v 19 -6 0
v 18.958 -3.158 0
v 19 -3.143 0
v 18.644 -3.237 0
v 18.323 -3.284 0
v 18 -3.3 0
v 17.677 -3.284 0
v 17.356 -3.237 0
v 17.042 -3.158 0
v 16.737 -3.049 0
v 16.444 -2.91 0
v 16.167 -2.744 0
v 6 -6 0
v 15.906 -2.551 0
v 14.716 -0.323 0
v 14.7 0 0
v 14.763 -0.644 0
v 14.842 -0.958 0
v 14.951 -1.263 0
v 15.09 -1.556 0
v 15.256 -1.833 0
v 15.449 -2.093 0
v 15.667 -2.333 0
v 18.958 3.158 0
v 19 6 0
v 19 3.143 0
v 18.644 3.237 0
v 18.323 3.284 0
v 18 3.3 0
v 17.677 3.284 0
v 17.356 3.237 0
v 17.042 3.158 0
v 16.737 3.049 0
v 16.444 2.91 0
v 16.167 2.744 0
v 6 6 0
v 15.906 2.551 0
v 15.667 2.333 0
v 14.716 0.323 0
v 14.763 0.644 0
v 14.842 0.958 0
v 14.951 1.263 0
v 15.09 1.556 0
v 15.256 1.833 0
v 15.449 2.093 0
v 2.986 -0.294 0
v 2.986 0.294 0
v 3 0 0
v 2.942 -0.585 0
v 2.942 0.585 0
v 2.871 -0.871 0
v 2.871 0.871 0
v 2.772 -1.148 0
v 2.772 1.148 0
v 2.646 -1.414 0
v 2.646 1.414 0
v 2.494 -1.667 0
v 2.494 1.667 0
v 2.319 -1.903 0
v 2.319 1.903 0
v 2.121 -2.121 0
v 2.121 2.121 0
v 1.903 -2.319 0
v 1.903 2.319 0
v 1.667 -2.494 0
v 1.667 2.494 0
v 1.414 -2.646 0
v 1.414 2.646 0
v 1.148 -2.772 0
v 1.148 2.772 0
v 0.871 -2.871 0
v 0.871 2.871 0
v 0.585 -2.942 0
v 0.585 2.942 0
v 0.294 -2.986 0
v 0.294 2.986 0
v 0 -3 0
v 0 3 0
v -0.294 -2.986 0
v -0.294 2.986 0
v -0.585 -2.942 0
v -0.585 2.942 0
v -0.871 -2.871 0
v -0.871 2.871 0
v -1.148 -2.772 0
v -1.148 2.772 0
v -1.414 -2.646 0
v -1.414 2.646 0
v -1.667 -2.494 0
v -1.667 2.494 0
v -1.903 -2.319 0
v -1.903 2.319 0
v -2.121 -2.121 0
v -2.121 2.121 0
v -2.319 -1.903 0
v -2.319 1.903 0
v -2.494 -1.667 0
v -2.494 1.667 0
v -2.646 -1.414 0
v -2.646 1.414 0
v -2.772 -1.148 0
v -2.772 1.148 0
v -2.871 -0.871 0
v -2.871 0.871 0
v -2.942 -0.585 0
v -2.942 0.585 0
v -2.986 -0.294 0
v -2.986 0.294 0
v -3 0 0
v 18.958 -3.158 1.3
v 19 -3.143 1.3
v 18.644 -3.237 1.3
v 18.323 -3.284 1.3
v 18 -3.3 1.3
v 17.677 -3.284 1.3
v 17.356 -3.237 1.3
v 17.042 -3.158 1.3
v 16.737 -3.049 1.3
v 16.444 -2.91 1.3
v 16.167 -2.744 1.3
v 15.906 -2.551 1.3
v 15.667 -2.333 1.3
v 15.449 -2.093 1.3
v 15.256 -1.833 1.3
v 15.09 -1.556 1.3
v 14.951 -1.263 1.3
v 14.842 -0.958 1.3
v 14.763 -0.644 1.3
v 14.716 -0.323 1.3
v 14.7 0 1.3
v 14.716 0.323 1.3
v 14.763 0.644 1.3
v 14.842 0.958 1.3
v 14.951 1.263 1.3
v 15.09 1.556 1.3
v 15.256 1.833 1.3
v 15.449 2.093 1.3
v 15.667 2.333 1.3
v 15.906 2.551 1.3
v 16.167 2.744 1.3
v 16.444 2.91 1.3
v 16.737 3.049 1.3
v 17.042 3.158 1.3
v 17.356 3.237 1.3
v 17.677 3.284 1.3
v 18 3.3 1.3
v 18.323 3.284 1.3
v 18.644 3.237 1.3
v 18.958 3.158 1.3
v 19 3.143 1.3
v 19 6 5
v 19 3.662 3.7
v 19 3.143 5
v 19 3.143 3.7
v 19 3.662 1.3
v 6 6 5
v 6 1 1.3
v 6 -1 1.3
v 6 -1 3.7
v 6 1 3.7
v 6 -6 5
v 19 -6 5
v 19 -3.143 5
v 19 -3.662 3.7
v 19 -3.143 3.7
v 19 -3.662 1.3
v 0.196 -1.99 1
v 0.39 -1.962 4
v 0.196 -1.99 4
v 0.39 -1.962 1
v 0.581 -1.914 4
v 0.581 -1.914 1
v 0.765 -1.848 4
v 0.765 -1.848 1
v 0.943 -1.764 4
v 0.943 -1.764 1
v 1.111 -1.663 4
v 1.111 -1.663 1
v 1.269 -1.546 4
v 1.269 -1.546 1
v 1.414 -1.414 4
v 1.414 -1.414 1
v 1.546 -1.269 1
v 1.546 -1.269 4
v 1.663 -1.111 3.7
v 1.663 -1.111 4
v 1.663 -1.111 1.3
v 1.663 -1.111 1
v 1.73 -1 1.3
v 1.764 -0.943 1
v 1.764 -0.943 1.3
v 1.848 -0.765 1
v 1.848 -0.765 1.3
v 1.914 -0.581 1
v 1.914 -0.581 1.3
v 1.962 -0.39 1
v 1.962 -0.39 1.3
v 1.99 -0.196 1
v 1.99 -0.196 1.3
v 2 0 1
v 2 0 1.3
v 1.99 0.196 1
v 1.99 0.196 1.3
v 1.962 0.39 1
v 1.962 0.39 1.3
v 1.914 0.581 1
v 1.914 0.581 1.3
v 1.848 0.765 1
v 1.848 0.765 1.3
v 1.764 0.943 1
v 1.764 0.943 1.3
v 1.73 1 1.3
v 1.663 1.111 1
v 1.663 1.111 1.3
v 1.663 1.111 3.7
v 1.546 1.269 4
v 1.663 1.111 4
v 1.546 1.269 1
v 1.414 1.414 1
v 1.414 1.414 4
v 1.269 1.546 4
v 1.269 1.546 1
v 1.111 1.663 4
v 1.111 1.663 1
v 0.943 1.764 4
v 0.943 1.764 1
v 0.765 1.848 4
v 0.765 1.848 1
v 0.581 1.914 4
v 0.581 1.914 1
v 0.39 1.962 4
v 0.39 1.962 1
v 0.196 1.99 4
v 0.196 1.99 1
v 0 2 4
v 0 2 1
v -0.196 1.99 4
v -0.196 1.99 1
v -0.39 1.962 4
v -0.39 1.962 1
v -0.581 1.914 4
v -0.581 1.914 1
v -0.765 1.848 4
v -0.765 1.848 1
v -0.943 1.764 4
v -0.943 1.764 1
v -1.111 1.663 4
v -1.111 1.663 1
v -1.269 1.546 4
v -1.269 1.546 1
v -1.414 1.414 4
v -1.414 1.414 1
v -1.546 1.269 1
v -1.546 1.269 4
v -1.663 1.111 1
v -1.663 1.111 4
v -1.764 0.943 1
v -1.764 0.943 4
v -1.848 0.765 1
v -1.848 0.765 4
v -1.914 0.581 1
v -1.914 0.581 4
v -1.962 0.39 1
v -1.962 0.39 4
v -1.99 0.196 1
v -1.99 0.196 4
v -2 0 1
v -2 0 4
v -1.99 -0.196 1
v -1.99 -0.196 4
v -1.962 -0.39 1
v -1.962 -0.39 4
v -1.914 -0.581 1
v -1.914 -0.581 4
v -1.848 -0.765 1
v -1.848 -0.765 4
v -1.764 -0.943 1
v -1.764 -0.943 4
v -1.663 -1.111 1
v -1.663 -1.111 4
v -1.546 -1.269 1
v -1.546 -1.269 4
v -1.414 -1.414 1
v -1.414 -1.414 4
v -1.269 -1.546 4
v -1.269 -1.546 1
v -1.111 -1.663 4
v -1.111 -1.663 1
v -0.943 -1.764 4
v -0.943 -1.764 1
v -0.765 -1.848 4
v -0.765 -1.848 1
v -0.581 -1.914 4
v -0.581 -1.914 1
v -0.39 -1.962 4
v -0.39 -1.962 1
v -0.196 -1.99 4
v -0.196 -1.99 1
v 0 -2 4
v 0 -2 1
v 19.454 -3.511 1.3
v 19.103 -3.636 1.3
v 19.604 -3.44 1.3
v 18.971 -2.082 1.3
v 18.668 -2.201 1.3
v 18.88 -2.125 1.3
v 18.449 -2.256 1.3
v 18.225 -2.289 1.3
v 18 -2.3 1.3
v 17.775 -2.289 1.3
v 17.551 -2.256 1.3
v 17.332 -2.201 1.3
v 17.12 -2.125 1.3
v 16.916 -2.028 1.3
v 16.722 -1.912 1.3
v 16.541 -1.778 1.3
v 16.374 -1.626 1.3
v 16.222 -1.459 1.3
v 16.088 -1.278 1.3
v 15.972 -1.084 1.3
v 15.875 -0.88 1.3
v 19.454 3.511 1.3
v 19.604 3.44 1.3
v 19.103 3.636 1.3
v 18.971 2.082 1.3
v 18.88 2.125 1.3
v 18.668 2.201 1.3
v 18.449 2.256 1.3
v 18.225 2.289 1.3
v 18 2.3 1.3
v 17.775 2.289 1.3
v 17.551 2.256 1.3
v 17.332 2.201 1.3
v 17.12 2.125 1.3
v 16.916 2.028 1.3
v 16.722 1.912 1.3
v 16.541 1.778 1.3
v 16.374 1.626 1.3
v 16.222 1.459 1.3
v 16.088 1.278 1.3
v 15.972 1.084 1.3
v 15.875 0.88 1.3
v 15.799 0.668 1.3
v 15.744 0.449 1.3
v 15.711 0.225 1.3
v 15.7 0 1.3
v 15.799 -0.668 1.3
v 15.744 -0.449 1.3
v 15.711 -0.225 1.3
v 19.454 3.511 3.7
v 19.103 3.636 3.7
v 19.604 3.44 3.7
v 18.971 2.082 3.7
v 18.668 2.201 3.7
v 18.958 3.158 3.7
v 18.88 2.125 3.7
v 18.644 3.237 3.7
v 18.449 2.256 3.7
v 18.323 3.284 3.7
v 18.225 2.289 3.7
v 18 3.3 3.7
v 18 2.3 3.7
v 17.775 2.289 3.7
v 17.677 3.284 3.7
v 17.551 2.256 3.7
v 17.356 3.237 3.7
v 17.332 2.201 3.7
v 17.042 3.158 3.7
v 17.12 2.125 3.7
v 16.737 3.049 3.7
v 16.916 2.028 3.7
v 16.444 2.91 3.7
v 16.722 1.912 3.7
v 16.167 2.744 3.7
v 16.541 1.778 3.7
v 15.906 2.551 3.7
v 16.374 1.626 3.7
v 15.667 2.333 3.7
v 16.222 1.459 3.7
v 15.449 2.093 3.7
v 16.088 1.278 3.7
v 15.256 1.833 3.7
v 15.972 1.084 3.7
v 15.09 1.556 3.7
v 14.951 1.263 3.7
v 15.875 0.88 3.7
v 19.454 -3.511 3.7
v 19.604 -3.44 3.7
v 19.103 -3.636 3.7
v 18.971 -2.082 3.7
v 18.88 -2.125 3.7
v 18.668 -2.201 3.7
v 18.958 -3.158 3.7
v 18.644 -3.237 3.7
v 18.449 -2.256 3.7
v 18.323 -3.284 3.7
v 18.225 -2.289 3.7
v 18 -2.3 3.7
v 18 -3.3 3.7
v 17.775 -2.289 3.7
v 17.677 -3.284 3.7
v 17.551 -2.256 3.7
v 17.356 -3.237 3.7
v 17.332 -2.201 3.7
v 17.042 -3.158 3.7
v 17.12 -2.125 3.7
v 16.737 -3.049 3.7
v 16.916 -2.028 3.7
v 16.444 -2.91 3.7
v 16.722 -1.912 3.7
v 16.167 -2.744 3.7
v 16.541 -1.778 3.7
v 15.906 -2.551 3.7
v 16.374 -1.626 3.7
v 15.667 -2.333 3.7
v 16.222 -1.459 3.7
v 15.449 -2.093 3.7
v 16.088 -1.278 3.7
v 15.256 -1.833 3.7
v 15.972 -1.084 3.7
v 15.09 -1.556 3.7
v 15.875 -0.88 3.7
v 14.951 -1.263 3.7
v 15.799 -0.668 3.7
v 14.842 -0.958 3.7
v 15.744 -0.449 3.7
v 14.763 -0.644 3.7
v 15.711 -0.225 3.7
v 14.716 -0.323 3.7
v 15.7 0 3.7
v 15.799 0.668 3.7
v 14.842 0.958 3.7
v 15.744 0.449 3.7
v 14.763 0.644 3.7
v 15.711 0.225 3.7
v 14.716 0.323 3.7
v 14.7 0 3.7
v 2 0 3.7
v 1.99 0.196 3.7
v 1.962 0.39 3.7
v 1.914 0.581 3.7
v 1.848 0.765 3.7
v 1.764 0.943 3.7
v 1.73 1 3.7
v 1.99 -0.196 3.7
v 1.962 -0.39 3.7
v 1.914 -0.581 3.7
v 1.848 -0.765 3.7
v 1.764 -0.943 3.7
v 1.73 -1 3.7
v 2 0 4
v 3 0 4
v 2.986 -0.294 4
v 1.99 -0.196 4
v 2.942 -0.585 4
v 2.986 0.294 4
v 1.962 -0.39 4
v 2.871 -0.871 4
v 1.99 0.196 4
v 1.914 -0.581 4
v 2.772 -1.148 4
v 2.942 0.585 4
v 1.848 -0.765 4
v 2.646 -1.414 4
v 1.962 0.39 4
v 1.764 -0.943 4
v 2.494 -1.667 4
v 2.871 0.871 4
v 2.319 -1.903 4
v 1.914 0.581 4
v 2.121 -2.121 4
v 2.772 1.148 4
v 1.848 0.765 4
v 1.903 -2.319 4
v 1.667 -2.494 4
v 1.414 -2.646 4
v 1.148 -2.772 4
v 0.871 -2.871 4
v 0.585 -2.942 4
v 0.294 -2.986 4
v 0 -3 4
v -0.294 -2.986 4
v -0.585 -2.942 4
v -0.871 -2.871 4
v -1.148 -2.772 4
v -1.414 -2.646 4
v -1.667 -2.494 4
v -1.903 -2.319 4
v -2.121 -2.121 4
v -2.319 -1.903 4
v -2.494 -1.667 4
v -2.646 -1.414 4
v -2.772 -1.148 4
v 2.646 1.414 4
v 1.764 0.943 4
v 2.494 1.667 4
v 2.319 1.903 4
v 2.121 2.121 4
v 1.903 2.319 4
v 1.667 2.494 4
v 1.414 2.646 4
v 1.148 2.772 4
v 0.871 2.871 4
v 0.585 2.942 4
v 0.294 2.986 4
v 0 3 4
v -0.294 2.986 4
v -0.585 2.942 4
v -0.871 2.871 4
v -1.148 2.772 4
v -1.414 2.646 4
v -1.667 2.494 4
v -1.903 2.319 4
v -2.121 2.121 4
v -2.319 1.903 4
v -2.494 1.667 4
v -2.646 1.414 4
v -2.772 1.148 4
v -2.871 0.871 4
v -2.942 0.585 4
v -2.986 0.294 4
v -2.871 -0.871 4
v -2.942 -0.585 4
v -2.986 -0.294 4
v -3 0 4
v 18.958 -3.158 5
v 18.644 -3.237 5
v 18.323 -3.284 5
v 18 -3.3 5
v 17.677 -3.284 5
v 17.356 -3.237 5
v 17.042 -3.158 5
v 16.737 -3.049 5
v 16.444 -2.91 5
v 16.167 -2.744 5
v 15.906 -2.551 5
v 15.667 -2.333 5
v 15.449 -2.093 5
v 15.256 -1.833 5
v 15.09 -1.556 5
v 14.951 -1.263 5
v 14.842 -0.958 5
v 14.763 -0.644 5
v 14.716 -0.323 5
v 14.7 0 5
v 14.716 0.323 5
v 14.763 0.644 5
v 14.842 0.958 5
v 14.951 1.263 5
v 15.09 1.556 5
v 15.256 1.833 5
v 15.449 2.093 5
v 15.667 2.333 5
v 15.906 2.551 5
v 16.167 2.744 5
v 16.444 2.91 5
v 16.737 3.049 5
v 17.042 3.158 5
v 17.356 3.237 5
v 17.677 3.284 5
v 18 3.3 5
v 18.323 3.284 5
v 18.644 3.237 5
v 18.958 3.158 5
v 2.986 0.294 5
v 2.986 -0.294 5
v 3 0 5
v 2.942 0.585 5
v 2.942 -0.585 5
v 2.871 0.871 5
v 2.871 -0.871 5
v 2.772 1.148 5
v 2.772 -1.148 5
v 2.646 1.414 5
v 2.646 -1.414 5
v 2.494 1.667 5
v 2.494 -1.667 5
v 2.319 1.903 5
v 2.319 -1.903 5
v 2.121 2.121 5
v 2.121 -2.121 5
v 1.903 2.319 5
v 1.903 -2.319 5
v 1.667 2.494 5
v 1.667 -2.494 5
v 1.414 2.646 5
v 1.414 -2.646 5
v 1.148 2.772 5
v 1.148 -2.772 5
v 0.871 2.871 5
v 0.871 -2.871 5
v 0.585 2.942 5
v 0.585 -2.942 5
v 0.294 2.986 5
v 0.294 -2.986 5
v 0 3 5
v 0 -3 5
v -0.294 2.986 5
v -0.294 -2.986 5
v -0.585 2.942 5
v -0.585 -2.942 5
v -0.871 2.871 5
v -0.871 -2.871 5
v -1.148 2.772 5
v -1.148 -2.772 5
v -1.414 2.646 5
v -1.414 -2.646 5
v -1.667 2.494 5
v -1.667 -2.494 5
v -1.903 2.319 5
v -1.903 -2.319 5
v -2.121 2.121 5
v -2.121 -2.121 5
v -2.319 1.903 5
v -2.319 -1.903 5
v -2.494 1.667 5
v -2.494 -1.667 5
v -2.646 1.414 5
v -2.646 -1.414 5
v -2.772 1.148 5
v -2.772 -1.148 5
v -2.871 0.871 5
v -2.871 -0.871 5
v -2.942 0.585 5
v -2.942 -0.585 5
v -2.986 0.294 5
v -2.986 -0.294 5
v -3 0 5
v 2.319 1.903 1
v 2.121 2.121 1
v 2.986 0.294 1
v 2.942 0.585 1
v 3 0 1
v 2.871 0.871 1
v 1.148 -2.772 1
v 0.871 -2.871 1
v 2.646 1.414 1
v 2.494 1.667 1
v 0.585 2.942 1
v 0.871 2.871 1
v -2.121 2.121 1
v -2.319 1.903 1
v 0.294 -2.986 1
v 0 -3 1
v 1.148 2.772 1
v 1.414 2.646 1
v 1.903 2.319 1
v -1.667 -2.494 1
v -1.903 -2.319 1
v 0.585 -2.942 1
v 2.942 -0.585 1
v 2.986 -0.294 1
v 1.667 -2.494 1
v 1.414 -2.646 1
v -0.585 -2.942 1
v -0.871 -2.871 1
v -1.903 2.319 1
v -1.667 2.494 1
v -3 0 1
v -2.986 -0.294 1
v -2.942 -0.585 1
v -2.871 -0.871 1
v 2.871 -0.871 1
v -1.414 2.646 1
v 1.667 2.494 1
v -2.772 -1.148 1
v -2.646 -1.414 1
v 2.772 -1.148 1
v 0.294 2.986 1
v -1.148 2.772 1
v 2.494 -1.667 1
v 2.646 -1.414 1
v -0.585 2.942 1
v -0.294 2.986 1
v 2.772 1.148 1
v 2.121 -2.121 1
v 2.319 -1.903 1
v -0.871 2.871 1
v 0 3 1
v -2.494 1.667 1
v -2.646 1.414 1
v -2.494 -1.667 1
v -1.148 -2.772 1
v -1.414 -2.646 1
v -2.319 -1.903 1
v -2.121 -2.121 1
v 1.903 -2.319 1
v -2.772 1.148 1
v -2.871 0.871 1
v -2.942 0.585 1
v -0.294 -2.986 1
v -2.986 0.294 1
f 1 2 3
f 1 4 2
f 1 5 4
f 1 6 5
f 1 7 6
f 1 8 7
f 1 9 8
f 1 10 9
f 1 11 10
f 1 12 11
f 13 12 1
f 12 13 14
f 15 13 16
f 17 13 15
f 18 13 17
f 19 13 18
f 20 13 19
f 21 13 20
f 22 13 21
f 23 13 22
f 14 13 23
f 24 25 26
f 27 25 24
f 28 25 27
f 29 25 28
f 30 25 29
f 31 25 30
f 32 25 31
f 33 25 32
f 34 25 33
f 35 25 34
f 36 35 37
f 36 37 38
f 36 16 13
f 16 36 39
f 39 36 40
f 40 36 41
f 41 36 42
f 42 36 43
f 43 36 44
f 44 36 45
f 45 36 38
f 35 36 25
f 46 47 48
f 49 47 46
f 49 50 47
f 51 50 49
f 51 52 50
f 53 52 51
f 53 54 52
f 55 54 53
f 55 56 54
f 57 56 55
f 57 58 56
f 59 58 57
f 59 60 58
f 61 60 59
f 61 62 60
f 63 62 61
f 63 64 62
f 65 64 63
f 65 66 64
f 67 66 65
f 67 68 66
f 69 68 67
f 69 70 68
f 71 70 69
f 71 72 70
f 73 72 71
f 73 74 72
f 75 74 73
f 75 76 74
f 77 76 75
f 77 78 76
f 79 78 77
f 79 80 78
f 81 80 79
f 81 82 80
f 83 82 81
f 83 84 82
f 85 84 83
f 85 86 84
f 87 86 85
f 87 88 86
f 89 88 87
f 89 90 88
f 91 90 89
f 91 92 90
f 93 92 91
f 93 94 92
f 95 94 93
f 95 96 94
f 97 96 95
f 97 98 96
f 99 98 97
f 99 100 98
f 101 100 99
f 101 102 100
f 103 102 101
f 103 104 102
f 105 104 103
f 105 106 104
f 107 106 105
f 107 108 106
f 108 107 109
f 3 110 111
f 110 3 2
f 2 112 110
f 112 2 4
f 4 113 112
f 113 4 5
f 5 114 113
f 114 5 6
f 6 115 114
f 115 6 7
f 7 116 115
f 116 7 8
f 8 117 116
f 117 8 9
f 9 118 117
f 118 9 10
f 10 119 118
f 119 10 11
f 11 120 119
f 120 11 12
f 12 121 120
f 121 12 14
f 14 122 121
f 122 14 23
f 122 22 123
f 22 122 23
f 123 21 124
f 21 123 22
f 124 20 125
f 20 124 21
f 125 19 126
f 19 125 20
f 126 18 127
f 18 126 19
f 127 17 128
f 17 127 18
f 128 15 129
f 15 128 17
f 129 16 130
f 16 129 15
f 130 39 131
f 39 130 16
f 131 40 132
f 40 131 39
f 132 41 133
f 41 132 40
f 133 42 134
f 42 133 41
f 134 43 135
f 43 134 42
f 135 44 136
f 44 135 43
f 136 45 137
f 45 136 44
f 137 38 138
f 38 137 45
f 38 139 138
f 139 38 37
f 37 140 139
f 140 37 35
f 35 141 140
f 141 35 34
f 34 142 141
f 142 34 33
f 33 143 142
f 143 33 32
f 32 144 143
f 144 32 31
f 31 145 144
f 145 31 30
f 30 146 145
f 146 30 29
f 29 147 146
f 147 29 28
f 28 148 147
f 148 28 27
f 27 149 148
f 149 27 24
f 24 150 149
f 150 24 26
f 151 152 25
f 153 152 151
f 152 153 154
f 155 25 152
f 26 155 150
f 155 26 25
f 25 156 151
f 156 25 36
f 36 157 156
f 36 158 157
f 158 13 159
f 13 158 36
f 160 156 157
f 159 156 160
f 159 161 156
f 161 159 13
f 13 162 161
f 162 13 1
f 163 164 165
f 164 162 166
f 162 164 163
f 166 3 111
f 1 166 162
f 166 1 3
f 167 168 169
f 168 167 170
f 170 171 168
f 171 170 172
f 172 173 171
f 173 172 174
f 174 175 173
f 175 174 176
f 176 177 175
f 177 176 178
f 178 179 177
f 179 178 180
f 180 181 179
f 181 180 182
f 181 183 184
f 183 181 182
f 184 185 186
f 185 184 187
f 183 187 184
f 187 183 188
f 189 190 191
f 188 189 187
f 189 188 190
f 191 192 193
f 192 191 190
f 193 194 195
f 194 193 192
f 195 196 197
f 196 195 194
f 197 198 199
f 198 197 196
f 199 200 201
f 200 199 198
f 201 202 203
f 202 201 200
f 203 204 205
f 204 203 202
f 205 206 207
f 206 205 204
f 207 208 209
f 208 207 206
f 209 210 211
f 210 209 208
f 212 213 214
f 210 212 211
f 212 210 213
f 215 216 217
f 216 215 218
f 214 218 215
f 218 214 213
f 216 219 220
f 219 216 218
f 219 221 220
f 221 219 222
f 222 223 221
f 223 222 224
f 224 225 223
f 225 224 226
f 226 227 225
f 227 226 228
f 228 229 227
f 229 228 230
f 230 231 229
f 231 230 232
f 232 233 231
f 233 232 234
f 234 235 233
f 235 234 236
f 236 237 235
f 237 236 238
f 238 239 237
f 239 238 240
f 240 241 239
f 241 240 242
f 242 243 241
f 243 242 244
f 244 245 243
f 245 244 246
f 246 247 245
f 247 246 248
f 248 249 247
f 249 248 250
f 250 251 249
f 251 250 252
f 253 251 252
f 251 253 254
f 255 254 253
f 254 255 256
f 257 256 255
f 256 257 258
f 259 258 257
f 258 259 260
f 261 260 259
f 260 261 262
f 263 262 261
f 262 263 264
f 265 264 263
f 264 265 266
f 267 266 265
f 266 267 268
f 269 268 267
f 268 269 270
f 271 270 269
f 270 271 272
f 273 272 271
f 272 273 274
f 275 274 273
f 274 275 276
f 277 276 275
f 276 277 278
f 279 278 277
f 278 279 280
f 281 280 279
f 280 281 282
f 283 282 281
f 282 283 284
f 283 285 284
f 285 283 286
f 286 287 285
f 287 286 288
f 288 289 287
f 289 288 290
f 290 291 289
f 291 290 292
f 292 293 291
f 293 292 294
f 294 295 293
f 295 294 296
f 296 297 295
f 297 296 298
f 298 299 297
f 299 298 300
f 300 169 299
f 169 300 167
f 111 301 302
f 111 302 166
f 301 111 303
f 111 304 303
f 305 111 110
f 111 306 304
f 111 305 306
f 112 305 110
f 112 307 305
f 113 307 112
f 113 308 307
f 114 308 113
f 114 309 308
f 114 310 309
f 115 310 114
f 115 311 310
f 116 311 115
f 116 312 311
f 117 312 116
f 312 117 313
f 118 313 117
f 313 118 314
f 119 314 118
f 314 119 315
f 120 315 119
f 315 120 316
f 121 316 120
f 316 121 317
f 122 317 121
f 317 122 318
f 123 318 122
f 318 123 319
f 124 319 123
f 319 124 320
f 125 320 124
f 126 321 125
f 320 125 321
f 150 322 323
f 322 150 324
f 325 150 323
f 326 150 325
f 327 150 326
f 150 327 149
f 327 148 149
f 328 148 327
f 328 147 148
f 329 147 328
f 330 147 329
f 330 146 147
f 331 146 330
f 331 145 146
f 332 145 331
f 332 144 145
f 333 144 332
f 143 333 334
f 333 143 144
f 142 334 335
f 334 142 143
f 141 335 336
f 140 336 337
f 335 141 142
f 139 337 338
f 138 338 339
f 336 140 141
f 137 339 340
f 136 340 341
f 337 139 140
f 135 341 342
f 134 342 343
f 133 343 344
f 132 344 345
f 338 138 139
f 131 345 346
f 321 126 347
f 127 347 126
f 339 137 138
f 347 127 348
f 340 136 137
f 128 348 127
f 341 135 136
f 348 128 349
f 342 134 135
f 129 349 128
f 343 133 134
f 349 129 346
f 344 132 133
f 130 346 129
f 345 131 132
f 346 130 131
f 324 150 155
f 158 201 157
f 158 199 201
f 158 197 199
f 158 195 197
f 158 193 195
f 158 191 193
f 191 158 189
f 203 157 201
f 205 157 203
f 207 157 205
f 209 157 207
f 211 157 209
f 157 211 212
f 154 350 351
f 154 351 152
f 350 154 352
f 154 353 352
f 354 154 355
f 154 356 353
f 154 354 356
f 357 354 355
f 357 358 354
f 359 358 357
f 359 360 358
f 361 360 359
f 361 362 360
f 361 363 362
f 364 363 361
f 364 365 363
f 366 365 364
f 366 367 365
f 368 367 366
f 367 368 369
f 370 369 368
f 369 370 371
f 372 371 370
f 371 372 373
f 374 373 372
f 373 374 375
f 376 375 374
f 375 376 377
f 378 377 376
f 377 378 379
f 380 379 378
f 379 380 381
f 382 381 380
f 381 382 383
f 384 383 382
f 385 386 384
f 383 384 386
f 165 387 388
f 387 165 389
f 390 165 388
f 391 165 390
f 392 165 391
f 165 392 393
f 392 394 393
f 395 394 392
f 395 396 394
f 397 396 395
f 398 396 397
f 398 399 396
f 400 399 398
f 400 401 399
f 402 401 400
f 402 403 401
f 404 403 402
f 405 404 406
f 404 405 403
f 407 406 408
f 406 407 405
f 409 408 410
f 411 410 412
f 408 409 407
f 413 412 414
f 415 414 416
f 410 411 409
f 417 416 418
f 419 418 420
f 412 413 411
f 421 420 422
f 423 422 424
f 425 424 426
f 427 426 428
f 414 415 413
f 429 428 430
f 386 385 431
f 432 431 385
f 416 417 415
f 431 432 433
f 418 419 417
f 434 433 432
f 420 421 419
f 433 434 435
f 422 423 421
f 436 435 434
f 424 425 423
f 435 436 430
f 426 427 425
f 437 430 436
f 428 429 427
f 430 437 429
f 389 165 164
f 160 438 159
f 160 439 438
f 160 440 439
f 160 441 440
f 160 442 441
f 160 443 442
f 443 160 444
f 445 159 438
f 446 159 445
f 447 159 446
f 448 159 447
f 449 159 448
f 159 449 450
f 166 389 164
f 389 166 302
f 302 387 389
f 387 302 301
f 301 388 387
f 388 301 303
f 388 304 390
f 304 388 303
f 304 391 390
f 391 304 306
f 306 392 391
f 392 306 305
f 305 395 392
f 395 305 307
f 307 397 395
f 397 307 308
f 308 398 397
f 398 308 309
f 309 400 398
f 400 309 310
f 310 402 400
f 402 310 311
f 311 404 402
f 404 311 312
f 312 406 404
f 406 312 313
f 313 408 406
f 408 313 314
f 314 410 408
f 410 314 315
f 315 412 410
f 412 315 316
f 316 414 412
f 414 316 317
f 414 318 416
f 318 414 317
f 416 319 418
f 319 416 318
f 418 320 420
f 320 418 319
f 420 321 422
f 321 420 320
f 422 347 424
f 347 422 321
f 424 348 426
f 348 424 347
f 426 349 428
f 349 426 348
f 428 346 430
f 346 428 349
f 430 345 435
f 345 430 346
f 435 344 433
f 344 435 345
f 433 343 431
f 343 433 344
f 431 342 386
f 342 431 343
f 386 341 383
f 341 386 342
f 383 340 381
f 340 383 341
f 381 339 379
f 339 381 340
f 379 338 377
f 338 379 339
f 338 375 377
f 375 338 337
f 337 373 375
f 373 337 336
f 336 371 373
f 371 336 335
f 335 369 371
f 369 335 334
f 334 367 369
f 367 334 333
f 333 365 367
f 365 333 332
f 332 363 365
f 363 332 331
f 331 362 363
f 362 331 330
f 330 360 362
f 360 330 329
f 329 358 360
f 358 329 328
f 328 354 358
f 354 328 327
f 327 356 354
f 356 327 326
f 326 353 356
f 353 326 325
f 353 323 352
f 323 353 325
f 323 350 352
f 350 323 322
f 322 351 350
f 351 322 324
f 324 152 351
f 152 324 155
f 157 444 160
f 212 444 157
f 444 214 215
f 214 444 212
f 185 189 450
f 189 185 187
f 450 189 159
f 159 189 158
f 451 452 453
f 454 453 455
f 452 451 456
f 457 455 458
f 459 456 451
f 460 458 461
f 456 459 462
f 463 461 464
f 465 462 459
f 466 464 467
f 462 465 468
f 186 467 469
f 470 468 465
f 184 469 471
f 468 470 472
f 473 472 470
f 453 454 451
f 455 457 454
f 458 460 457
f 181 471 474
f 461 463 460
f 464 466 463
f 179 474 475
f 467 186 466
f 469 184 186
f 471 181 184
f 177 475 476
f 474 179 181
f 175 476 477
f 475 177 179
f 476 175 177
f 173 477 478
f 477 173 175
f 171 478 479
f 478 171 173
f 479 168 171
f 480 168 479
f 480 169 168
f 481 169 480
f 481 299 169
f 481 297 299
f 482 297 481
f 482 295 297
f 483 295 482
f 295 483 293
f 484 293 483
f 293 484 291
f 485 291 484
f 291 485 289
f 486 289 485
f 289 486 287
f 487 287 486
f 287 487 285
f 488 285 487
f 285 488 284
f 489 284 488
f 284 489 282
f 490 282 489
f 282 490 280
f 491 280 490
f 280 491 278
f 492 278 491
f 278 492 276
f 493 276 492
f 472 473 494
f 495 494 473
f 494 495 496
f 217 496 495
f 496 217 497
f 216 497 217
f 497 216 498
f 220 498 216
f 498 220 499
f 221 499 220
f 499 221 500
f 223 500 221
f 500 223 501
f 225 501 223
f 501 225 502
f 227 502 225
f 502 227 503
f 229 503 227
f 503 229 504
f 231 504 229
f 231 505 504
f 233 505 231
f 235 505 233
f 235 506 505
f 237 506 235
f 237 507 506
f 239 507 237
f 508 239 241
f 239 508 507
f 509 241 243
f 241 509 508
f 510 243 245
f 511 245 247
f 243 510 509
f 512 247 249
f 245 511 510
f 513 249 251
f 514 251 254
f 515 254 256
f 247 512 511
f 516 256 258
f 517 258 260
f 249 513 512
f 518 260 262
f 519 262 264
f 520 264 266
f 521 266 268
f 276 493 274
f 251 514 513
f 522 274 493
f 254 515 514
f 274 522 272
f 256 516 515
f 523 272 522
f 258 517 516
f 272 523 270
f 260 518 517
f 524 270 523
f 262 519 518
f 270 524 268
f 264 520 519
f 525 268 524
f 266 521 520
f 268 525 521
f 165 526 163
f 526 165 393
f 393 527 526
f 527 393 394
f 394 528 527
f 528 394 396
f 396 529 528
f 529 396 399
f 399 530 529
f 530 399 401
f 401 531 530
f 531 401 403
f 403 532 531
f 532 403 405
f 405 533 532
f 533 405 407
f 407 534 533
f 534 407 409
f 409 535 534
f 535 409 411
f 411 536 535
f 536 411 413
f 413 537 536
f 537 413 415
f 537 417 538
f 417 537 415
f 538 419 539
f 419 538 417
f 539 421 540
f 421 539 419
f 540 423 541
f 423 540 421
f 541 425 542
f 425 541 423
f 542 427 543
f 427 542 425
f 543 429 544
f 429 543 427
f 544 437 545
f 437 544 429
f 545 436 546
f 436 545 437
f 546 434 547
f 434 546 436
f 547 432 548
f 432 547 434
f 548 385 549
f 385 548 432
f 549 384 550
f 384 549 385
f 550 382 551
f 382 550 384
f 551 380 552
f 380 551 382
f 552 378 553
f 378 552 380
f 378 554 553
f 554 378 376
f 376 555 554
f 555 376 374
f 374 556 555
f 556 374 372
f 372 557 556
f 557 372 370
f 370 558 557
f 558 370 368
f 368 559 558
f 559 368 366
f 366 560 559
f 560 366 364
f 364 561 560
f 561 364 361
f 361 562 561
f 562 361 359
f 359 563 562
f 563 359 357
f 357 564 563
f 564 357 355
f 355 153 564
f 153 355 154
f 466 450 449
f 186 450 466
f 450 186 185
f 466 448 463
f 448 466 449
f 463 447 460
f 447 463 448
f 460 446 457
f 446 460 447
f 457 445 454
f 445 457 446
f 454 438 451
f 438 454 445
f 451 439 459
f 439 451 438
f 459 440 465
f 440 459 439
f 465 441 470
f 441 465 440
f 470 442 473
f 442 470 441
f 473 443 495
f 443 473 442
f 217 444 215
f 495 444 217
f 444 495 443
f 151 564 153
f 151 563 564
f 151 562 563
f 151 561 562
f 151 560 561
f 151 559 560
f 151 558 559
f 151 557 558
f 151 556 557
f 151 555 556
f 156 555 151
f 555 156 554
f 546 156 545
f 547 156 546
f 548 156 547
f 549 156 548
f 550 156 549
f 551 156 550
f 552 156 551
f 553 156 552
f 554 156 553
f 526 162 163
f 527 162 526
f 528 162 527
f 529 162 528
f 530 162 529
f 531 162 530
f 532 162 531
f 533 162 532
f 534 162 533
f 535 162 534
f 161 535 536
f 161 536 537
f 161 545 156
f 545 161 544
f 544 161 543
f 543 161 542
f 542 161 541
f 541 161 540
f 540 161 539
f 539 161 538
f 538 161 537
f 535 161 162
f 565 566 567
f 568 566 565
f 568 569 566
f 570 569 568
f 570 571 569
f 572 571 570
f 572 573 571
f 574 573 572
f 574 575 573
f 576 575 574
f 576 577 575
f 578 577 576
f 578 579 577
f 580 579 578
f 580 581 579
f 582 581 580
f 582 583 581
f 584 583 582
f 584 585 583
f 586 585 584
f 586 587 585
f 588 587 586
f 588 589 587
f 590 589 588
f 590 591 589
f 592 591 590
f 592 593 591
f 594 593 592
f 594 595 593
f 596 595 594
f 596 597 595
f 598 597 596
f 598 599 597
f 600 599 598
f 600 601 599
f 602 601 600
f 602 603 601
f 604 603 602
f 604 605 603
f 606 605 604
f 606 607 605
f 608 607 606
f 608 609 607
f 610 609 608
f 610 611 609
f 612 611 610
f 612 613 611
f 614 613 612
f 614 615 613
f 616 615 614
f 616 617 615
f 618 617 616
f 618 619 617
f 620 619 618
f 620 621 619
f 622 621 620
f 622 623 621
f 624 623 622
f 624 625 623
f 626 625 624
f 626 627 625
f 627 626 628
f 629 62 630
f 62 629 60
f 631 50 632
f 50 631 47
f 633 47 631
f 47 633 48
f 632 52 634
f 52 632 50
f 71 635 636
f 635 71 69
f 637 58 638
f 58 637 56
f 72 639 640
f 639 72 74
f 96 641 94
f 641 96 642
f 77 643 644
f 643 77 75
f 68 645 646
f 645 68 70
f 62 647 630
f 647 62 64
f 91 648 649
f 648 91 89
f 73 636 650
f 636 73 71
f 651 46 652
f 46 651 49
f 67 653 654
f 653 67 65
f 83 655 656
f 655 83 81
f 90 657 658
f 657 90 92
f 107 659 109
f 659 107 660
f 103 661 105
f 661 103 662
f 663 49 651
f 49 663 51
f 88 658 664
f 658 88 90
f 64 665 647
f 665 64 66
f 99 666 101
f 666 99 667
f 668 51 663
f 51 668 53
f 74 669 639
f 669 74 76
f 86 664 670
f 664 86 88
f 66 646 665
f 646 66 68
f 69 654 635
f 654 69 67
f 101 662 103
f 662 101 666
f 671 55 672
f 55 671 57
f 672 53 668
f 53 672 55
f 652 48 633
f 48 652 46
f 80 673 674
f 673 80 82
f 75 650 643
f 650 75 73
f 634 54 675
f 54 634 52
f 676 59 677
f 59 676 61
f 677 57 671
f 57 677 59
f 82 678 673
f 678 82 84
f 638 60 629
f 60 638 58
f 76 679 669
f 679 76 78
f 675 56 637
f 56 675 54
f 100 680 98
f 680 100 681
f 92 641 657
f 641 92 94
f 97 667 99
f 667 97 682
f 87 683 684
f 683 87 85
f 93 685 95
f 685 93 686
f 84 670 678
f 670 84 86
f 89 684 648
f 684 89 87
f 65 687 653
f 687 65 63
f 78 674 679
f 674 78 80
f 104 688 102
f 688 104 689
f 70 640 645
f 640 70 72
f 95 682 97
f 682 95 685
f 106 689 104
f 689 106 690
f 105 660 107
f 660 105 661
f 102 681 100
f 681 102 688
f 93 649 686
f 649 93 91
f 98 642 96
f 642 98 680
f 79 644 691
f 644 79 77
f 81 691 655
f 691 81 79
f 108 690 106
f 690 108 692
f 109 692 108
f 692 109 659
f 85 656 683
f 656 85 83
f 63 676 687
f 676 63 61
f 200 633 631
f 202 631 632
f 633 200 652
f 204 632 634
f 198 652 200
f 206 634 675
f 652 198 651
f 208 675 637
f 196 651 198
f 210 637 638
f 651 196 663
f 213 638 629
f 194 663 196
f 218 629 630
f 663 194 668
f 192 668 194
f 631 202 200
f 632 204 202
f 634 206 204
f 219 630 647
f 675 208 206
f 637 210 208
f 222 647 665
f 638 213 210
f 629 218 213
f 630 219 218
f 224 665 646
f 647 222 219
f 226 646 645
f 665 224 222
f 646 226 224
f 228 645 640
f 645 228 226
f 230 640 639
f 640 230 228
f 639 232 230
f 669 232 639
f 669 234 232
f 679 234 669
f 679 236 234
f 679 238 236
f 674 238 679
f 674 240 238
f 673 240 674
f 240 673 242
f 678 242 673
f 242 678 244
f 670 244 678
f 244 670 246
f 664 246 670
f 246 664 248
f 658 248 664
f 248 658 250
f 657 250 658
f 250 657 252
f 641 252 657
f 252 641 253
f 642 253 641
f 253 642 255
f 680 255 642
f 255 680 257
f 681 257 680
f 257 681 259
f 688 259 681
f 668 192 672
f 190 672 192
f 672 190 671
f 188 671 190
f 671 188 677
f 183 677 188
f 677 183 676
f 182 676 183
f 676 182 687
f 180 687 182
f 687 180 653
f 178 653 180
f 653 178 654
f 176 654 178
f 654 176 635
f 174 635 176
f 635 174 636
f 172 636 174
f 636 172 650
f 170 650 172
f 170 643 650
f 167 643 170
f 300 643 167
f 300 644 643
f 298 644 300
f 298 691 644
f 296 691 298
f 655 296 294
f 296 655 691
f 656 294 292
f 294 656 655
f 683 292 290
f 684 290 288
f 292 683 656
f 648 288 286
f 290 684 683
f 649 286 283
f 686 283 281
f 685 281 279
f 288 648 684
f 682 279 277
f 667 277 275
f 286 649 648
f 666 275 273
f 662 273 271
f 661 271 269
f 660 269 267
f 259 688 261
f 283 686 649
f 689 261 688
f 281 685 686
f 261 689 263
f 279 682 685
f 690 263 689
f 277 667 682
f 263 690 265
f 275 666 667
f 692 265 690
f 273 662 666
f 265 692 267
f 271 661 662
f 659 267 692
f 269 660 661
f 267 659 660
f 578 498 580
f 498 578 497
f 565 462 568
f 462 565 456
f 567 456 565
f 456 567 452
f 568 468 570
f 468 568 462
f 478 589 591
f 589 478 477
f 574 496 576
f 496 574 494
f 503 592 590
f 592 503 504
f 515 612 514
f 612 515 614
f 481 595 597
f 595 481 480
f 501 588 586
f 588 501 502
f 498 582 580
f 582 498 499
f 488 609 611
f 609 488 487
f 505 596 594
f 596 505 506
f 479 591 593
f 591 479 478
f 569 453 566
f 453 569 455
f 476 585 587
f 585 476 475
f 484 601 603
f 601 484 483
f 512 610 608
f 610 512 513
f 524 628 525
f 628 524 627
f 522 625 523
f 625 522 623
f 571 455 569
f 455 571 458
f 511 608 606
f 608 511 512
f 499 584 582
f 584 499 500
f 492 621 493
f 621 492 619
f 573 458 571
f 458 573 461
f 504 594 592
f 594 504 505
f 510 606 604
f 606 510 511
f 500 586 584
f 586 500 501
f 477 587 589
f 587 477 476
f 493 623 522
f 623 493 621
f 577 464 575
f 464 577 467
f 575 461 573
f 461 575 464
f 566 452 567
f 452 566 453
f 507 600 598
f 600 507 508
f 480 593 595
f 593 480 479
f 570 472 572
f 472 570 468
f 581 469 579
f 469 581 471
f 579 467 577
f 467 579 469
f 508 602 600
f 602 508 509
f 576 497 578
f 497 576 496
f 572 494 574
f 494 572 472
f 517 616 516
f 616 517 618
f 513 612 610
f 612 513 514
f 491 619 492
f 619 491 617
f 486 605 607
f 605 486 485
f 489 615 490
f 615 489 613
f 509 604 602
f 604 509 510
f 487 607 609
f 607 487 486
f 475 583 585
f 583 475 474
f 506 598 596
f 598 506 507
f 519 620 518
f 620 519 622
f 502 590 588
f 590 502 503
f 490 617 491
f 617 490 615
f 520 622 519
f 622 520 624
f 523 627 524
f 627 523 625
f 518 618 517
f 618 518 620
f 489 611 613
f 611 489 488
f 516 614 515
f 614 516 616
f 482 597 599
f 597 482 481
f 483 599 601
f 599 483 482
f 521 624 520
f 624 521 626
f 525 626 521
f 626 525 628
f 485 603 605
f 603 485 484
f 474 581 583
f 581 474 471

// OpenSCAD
part = "link"; // [link, assembly]
cadverify_only = "";
module instance(name, part, unit = 1) {
    echo(cadverify_instance = [name, part, unit]);
    if (cadverify_only == "" || cadverify_only == name) children();
}

// Parameters (mm)
pitch = 18;          // pin-to-bore distance (10 links = 180mm)
link_w = 12;         // width (Y)
link_t = 5;          // thickness (Z)
pin_d = 4;           // pin shaft diameter
bore_d = 4.6;        // bore diameter (0.3 radial clearance)
cap_d = 6;           // cap diameter
cap_h = 1;           // cap thickness
gap_z = 0.3;         // vertical clearance cap<->knuckle
kn_out_d = 7.6;      // knuckle outer diameter (1.5 wall)
cap_cav_d = 6.6;     // cap cavity diameter (0.3 radial clearance)
neck_w = 2;          // neck width (middle layer only)
neck_t = 2.4;        // neck thickness = knuckle height
slot_half = 65;      // slot half-angle (deg), allows +-30 deg swing
yoke_west = 6;       // yoke west edge (local X)
yoke_east = 19;      // yoke east extent (local X)
$fn = 64;

module link_geom() {
    bore_x = pitch;
    pin_r = pin_d/2;
    bore_r = bore_d/2;
    kn_out_r = kn_out_d/2;
    cav_r = cap_cav_d/2;
    cap_r = cap_d/2;
    wedge_far = 30;
    dy_far = wedge_far * tan(slot_half);
    bot_h = cap_h;            // 0..1
    gap_h = gap_z;            // 0.3
    kn_h = link_t - 2*cap_h - 2*gap_h; // 2.4 (1.3..3.7)
    // bottom (0..1): pin disc + yoke, closed cap pocket, NO slot
    translate([0,0,0]) linear_extrude(height = bot_h, convexity = 8) {
        difference() {
            union() {
                circle(r = pin_r);
                translate([yoke_west,-link_w/2]) square([yoke_east-yoke_west, link_w]);
            }
            translate([bore_x,0]) circle(r = cav_r);
        }
    }
    // lower gap (1..1.3): pin + yoke, closed pocket, NO slot
    translate([0,0,bot_h]) linear_extrude(height = gap_h, convexity = 8) {
        difference() {
            union() {
                circle(r = pin_r);
                translate([yoke_west,-link_w/2]) square([yoke_east-yoke_west, link_w]);
            }
            translate([bore_x,0]) circle(r = cav_r);
        }
    }
    // middle (1.3..3.7): pin + middle neck + yoke + knuckle ring, wide slot
    translate([0,0,bot_h+gap_h]) linear_extrude(height = kn_h, convexity = 8) {
        difference() {
            union() {
                circle(r = pin_r);
                translate([0,-neck_w/2]) square([yoke_west+1, neck_w]);
                translate([yoke_west,-link_w/2]) square([yoke_east-yoke_west, link_w]);
                translate([bore_x,0]) circle(r = kn_out_r);
            }
            translate([bore_x,0]) circle(r = bore_r);
            polygon(points = [[bore_x,0],[bore_x+wedge_far, dy_far],[bore_x+wedge_far, -dy_far]]);
        }
    }
    // upper gap (3.7..4): closed pocket
    translate([0,0,bot_h+gap_h+kn_h]) linear_extrude(height = gap_h, convexity = 8) {
        difference() {
            union() {
                circle(r = pin_r);
                translate([yoke_west,-link_w/2]) square([yoke_east-yoke_west, link_w]);
            }
            translate([bore_x,0]) circle(r = cav_r);
        }
    }
    // top (4..5): closed pocket
    translate([0,0,bot_h+gap_h+kn_h+gap_h]) linear_extrude(height = bot_h, convexity = 8) {
        difference() {
            union() {
                circle(r = pin_r);
                translate([yoke_west,-link_w/2]) square([yoke_east-yoke_west, link_w]);
            }
            translate([bore_x,0]) circle(r = cav_r);
        }
    }
    // caps (pin ends)
    translate([0,0,0]) cylinder(h = cap_h, r = cap_r);
    translate([0,0,link_t-cap_h]) cylinder(h = cap_h, r = cap_r);
}

if (part == "assembly") {
    instance("link1", "link", 1) translate([0,0,0]) link_geom();
    instance("link2", "link", 1) translate([18,0,0]) link_geom();
    instance("link3", "link", 1) translate([36,0,0]) link_geom();
    echo(cadverify_spec = [
        ["bounds", [[-3, -6, 0], [55.7, 6, 5]]],
        ["support_faces", [["bed", "-z", 200]]],
        ["motions", [
            ["bend", ["link3"], "rotate", [36, 0, 0], [0, 0, 1], [-30, 30]]
        ]],
        ["assembly_order", [
            [["link1", "link2", "link3"], [0, 0, 0]]
        ]],
        ["print_in_place", 0.3],
        ["overhangs_allowed", [
            ["pin cap link1", [[-3, -3, 3.8], [3, 3, 4.2]]],
            ["knuckle joint1", [[14, -4, 1.0], [22, 4, 1.6]]],
            ["pin cap link2", [[15, -3, 3.8], [21, 3, 4.2]]],
            ["knuckle joint2", [[32, -4, 1.0], [40, 4, 1.6]]],
            ["pin cap link3", [[33, -3, 3.8], [39, 3, 4.2]]],
            ["knuckle end", [[50, -4, 1.0], [58, 4, 1.6]]]
        ]],
        ["held", ["link1", "link2", "link3"]]
    ]);
} else {
    link_geom();
    echo(cadverify_spec = [
        ["bounds", [[-3, -6, 0], [19.7, 6, 5]]],
        ["bodies", 1],
        ["through_holes", 0],
        ["support_faces", [["bed", "-z", 100]]],
        ["overhangs_allowed", [
            ["pin cap", [[-3, -3, 3.8], [3, 3, 4.2]]],
            ["knuckle ceiling", [[14, -4, 1.0], [22, 4, 1.6]]]
        ]],
        ["copies", 3],
        ["details", [
            ["body", "material", [[6, -6, 0], [14, 6, 5]], 0.85],
            ["neck", "material", [[0, -1, 1.3], [7, 1, 3.7]], 0.8],
            ["knuckle", "material", [[14.2, -3.8, 1.3], [21.8, 3.8, 3.7]], 0.25],
            ["slot", "void", [[19, -1, 1.3], [21, 1, 3.7]], 0.8],
            ["cap_cavity", "void", [[14.7, -3.3, 0], [21.3, 3.3, 1]], 0.5],
            ["wall", "thickness", [18, 7, 2.5], [0, -1, 0], 3.7],
            ["floor", "thickness", [9, 0, -1], [0, 0, 1], 5]
        ]]
    ]);
}
